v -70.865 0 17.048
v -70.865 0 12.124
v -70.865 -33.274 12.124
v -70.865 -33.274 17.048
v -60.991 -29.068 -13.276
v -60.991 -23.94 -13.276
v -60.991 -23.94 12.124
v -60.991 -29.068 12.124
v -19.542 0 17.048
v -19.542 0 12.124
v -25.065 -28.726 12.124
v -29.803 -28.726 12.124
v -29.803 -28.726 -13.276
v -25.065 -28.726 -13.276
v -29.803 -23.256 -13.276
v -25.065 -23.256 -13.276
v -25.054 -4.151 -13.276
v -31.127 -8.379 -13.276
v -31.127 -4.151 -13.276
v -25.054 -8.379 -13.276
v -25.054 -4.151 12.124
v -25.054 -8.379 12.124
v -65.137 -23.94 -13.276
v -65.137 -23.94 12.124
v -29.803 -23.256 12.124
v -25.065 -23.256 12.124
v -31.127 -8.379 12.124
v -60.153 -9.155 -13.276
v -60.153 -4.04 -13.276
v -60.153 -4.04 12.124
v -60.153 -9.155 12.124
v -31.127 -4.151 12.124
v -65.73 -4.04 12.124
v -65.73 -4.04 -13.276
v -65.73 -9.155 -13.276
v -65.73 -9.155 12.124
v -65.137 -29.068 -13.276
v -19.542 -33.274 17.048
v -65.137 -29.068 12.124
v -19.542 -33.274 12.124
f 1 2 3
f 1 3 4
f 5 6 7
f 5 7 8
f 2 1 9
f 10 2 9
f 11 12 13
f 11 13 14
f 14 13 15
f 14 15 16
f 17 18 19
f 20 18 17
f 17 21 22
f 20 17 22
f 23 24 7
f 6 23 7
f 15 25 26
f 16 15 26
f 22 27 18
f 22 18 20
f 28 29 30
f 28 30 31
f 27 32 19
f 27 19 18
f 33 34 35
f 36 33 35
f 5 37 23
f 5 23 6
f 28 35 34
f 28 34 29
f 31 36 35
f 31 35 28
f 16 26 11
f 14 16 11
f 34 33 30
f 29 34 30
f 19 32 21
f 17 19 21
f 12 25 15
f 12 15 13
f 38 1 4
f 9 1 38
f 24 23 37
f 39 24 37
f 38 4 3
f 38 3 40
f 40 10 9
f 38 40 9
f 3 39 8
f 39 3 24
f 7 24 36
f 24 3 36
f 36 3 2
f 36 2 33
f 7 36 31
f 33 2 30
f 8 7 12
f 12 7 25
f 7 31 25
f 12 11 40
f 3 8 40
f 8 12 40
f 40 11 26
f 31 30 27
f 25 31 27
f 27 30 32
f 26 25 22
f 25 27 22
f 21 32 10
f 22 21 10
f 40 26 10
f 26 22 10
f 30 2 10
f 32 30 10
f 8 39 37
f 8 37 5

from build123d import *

# Parameters (mm, degrees)
F0_W     = 51.322882995
F0_H     = 4.9239350483
F1_DEPTH = 33.274
F2_W     = 4.1453018785
F2_H     = 5.1284935325
F3_DEPTH = 25.4
F4_W     = 4.7375038266
F4_H     = 5.470385775
F5_DEPTH = 25.4
F6_W     = 5.5771172047
F6_H     = 5.1148859784
F7_DEPTH = 25.4
F8_W     = 6.0726962984
F8_H     = 4.2278408073
F9_DEPTH = 25.4


with BuildPart() as f1:
    # F0 (on Front) → F1 (new body)
    with BuildSketch(Plane.XZ):
        with Locations((-45.2036233619, 14.5862386562)):
            Rectangle(F0_W, F0_H)
    extrude(amount=F1_DEPTH)

    # F2 (on face) → F3 (join)
    with BuildSketch(Plane(origin=(0, 0, 12.1242711321), x_dir=(1, 0, 0), z_dir=(0, 0, -1))):
        with Locations((-63.0641318858, 26.5037836507)):
            Rectangle(F2_W, F2_H)
    extrude(amount=F3_DEPTH)

    # F4 (on face) → F5 (join)
    with BuildSketch(Plane(origin=(0, 0, 12.1242711321), x_dir=(1, 0, 0), z_dir=(0, 0, -1))):
        with Locations((-27.434207499, 25.9909359738)):
            Rectangle(F4_W, F4_H)
    extrude(amount=F5_DEPTH)

    # F6 (on face) → F7 (join)
    with BuildSketch(Plane(origin=(0, 0, 12.1242711321), x_dir=(1, 0, 0), z_dir=(0, 0, -1))):
        with Locations((-62.9411712289, 6.5979263745)):
            Rectangle(F6_W, F6_H)
    extrude(amount=F7_DEPTH)

    # F8 (on face) → F9 (join)
    with BuildSketch(Plane(origin=(0, 0, 12.1242711321), x_dir=(1, 0, 0), z_dir=(0, 0, -1))):
        with Locations((-28.0904341489, 6.2653592322)):
            Rectangle(F8_W, F8_H)
    extrude(amount=F9_DEPTH)


solid = f1.part
